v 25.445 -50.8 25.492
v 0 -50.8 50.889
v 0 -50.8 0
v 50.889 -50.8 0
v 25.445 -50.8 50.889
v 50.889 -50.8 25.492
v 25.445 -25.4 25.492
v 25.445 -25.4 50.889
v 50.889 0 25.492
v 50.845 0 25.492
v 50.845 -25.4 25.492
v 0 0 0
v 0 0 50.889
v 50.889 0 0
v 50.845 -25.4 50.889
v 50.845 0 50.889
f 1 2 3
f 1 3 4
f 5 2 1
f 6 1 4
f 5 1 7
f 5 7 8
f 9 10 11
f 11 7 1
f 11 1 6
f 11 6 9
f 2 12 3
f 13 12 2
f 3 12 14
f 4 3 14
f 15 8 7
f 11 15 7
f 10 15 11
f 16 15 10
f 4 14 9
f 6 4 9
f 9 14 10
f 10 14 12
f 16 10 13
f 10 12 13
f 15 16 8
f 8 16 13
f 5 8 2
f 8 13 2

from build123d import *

# Parameters (mm, degrees)
F0_W     = 50.8894138038
F0_H     = 50.8894175291
F1_DEPTH = 50.8
F2_W     = 25.4447069019
F2_H     = 25.3969691694
F3_DEPTH = 50.8
F5_DEPTH = 25.4


with BuildPart() as f1:
    # F0 (on Front) → F1 (new body)
    with BuildSketch(Plane.XZ):
        with Locations((25.4447069019, 25.4447087646)):
            Rectangle(F0_W, F0_H)
    extrude(amount=F1_DEPTH)

    # F2 (on face) → F3 (cut)
    with BuildSketch(Plane.XZ.offset(50.8)):
        with Locations((38.1670603529, 38.1909329444)):
            Rectangle(F2_W, F2_H)
    extrude(amount=-F3_DEPTH, mode=Mode.SUBTRACT)

    # F4 (on face) → F5 (join)
    with BuildSketch(Plane.YZ.offset(25.4447069019)):
        Polygon((0, 50.8894175291), (-25.4, 50.8894175291), (-25.4, 25.4924483597), (0, 25.4924483597), (0, 29.243901372), (0, 43.372977525), align=None)
    extrude(amount=F5_DEPTH)


solid = f1.part
